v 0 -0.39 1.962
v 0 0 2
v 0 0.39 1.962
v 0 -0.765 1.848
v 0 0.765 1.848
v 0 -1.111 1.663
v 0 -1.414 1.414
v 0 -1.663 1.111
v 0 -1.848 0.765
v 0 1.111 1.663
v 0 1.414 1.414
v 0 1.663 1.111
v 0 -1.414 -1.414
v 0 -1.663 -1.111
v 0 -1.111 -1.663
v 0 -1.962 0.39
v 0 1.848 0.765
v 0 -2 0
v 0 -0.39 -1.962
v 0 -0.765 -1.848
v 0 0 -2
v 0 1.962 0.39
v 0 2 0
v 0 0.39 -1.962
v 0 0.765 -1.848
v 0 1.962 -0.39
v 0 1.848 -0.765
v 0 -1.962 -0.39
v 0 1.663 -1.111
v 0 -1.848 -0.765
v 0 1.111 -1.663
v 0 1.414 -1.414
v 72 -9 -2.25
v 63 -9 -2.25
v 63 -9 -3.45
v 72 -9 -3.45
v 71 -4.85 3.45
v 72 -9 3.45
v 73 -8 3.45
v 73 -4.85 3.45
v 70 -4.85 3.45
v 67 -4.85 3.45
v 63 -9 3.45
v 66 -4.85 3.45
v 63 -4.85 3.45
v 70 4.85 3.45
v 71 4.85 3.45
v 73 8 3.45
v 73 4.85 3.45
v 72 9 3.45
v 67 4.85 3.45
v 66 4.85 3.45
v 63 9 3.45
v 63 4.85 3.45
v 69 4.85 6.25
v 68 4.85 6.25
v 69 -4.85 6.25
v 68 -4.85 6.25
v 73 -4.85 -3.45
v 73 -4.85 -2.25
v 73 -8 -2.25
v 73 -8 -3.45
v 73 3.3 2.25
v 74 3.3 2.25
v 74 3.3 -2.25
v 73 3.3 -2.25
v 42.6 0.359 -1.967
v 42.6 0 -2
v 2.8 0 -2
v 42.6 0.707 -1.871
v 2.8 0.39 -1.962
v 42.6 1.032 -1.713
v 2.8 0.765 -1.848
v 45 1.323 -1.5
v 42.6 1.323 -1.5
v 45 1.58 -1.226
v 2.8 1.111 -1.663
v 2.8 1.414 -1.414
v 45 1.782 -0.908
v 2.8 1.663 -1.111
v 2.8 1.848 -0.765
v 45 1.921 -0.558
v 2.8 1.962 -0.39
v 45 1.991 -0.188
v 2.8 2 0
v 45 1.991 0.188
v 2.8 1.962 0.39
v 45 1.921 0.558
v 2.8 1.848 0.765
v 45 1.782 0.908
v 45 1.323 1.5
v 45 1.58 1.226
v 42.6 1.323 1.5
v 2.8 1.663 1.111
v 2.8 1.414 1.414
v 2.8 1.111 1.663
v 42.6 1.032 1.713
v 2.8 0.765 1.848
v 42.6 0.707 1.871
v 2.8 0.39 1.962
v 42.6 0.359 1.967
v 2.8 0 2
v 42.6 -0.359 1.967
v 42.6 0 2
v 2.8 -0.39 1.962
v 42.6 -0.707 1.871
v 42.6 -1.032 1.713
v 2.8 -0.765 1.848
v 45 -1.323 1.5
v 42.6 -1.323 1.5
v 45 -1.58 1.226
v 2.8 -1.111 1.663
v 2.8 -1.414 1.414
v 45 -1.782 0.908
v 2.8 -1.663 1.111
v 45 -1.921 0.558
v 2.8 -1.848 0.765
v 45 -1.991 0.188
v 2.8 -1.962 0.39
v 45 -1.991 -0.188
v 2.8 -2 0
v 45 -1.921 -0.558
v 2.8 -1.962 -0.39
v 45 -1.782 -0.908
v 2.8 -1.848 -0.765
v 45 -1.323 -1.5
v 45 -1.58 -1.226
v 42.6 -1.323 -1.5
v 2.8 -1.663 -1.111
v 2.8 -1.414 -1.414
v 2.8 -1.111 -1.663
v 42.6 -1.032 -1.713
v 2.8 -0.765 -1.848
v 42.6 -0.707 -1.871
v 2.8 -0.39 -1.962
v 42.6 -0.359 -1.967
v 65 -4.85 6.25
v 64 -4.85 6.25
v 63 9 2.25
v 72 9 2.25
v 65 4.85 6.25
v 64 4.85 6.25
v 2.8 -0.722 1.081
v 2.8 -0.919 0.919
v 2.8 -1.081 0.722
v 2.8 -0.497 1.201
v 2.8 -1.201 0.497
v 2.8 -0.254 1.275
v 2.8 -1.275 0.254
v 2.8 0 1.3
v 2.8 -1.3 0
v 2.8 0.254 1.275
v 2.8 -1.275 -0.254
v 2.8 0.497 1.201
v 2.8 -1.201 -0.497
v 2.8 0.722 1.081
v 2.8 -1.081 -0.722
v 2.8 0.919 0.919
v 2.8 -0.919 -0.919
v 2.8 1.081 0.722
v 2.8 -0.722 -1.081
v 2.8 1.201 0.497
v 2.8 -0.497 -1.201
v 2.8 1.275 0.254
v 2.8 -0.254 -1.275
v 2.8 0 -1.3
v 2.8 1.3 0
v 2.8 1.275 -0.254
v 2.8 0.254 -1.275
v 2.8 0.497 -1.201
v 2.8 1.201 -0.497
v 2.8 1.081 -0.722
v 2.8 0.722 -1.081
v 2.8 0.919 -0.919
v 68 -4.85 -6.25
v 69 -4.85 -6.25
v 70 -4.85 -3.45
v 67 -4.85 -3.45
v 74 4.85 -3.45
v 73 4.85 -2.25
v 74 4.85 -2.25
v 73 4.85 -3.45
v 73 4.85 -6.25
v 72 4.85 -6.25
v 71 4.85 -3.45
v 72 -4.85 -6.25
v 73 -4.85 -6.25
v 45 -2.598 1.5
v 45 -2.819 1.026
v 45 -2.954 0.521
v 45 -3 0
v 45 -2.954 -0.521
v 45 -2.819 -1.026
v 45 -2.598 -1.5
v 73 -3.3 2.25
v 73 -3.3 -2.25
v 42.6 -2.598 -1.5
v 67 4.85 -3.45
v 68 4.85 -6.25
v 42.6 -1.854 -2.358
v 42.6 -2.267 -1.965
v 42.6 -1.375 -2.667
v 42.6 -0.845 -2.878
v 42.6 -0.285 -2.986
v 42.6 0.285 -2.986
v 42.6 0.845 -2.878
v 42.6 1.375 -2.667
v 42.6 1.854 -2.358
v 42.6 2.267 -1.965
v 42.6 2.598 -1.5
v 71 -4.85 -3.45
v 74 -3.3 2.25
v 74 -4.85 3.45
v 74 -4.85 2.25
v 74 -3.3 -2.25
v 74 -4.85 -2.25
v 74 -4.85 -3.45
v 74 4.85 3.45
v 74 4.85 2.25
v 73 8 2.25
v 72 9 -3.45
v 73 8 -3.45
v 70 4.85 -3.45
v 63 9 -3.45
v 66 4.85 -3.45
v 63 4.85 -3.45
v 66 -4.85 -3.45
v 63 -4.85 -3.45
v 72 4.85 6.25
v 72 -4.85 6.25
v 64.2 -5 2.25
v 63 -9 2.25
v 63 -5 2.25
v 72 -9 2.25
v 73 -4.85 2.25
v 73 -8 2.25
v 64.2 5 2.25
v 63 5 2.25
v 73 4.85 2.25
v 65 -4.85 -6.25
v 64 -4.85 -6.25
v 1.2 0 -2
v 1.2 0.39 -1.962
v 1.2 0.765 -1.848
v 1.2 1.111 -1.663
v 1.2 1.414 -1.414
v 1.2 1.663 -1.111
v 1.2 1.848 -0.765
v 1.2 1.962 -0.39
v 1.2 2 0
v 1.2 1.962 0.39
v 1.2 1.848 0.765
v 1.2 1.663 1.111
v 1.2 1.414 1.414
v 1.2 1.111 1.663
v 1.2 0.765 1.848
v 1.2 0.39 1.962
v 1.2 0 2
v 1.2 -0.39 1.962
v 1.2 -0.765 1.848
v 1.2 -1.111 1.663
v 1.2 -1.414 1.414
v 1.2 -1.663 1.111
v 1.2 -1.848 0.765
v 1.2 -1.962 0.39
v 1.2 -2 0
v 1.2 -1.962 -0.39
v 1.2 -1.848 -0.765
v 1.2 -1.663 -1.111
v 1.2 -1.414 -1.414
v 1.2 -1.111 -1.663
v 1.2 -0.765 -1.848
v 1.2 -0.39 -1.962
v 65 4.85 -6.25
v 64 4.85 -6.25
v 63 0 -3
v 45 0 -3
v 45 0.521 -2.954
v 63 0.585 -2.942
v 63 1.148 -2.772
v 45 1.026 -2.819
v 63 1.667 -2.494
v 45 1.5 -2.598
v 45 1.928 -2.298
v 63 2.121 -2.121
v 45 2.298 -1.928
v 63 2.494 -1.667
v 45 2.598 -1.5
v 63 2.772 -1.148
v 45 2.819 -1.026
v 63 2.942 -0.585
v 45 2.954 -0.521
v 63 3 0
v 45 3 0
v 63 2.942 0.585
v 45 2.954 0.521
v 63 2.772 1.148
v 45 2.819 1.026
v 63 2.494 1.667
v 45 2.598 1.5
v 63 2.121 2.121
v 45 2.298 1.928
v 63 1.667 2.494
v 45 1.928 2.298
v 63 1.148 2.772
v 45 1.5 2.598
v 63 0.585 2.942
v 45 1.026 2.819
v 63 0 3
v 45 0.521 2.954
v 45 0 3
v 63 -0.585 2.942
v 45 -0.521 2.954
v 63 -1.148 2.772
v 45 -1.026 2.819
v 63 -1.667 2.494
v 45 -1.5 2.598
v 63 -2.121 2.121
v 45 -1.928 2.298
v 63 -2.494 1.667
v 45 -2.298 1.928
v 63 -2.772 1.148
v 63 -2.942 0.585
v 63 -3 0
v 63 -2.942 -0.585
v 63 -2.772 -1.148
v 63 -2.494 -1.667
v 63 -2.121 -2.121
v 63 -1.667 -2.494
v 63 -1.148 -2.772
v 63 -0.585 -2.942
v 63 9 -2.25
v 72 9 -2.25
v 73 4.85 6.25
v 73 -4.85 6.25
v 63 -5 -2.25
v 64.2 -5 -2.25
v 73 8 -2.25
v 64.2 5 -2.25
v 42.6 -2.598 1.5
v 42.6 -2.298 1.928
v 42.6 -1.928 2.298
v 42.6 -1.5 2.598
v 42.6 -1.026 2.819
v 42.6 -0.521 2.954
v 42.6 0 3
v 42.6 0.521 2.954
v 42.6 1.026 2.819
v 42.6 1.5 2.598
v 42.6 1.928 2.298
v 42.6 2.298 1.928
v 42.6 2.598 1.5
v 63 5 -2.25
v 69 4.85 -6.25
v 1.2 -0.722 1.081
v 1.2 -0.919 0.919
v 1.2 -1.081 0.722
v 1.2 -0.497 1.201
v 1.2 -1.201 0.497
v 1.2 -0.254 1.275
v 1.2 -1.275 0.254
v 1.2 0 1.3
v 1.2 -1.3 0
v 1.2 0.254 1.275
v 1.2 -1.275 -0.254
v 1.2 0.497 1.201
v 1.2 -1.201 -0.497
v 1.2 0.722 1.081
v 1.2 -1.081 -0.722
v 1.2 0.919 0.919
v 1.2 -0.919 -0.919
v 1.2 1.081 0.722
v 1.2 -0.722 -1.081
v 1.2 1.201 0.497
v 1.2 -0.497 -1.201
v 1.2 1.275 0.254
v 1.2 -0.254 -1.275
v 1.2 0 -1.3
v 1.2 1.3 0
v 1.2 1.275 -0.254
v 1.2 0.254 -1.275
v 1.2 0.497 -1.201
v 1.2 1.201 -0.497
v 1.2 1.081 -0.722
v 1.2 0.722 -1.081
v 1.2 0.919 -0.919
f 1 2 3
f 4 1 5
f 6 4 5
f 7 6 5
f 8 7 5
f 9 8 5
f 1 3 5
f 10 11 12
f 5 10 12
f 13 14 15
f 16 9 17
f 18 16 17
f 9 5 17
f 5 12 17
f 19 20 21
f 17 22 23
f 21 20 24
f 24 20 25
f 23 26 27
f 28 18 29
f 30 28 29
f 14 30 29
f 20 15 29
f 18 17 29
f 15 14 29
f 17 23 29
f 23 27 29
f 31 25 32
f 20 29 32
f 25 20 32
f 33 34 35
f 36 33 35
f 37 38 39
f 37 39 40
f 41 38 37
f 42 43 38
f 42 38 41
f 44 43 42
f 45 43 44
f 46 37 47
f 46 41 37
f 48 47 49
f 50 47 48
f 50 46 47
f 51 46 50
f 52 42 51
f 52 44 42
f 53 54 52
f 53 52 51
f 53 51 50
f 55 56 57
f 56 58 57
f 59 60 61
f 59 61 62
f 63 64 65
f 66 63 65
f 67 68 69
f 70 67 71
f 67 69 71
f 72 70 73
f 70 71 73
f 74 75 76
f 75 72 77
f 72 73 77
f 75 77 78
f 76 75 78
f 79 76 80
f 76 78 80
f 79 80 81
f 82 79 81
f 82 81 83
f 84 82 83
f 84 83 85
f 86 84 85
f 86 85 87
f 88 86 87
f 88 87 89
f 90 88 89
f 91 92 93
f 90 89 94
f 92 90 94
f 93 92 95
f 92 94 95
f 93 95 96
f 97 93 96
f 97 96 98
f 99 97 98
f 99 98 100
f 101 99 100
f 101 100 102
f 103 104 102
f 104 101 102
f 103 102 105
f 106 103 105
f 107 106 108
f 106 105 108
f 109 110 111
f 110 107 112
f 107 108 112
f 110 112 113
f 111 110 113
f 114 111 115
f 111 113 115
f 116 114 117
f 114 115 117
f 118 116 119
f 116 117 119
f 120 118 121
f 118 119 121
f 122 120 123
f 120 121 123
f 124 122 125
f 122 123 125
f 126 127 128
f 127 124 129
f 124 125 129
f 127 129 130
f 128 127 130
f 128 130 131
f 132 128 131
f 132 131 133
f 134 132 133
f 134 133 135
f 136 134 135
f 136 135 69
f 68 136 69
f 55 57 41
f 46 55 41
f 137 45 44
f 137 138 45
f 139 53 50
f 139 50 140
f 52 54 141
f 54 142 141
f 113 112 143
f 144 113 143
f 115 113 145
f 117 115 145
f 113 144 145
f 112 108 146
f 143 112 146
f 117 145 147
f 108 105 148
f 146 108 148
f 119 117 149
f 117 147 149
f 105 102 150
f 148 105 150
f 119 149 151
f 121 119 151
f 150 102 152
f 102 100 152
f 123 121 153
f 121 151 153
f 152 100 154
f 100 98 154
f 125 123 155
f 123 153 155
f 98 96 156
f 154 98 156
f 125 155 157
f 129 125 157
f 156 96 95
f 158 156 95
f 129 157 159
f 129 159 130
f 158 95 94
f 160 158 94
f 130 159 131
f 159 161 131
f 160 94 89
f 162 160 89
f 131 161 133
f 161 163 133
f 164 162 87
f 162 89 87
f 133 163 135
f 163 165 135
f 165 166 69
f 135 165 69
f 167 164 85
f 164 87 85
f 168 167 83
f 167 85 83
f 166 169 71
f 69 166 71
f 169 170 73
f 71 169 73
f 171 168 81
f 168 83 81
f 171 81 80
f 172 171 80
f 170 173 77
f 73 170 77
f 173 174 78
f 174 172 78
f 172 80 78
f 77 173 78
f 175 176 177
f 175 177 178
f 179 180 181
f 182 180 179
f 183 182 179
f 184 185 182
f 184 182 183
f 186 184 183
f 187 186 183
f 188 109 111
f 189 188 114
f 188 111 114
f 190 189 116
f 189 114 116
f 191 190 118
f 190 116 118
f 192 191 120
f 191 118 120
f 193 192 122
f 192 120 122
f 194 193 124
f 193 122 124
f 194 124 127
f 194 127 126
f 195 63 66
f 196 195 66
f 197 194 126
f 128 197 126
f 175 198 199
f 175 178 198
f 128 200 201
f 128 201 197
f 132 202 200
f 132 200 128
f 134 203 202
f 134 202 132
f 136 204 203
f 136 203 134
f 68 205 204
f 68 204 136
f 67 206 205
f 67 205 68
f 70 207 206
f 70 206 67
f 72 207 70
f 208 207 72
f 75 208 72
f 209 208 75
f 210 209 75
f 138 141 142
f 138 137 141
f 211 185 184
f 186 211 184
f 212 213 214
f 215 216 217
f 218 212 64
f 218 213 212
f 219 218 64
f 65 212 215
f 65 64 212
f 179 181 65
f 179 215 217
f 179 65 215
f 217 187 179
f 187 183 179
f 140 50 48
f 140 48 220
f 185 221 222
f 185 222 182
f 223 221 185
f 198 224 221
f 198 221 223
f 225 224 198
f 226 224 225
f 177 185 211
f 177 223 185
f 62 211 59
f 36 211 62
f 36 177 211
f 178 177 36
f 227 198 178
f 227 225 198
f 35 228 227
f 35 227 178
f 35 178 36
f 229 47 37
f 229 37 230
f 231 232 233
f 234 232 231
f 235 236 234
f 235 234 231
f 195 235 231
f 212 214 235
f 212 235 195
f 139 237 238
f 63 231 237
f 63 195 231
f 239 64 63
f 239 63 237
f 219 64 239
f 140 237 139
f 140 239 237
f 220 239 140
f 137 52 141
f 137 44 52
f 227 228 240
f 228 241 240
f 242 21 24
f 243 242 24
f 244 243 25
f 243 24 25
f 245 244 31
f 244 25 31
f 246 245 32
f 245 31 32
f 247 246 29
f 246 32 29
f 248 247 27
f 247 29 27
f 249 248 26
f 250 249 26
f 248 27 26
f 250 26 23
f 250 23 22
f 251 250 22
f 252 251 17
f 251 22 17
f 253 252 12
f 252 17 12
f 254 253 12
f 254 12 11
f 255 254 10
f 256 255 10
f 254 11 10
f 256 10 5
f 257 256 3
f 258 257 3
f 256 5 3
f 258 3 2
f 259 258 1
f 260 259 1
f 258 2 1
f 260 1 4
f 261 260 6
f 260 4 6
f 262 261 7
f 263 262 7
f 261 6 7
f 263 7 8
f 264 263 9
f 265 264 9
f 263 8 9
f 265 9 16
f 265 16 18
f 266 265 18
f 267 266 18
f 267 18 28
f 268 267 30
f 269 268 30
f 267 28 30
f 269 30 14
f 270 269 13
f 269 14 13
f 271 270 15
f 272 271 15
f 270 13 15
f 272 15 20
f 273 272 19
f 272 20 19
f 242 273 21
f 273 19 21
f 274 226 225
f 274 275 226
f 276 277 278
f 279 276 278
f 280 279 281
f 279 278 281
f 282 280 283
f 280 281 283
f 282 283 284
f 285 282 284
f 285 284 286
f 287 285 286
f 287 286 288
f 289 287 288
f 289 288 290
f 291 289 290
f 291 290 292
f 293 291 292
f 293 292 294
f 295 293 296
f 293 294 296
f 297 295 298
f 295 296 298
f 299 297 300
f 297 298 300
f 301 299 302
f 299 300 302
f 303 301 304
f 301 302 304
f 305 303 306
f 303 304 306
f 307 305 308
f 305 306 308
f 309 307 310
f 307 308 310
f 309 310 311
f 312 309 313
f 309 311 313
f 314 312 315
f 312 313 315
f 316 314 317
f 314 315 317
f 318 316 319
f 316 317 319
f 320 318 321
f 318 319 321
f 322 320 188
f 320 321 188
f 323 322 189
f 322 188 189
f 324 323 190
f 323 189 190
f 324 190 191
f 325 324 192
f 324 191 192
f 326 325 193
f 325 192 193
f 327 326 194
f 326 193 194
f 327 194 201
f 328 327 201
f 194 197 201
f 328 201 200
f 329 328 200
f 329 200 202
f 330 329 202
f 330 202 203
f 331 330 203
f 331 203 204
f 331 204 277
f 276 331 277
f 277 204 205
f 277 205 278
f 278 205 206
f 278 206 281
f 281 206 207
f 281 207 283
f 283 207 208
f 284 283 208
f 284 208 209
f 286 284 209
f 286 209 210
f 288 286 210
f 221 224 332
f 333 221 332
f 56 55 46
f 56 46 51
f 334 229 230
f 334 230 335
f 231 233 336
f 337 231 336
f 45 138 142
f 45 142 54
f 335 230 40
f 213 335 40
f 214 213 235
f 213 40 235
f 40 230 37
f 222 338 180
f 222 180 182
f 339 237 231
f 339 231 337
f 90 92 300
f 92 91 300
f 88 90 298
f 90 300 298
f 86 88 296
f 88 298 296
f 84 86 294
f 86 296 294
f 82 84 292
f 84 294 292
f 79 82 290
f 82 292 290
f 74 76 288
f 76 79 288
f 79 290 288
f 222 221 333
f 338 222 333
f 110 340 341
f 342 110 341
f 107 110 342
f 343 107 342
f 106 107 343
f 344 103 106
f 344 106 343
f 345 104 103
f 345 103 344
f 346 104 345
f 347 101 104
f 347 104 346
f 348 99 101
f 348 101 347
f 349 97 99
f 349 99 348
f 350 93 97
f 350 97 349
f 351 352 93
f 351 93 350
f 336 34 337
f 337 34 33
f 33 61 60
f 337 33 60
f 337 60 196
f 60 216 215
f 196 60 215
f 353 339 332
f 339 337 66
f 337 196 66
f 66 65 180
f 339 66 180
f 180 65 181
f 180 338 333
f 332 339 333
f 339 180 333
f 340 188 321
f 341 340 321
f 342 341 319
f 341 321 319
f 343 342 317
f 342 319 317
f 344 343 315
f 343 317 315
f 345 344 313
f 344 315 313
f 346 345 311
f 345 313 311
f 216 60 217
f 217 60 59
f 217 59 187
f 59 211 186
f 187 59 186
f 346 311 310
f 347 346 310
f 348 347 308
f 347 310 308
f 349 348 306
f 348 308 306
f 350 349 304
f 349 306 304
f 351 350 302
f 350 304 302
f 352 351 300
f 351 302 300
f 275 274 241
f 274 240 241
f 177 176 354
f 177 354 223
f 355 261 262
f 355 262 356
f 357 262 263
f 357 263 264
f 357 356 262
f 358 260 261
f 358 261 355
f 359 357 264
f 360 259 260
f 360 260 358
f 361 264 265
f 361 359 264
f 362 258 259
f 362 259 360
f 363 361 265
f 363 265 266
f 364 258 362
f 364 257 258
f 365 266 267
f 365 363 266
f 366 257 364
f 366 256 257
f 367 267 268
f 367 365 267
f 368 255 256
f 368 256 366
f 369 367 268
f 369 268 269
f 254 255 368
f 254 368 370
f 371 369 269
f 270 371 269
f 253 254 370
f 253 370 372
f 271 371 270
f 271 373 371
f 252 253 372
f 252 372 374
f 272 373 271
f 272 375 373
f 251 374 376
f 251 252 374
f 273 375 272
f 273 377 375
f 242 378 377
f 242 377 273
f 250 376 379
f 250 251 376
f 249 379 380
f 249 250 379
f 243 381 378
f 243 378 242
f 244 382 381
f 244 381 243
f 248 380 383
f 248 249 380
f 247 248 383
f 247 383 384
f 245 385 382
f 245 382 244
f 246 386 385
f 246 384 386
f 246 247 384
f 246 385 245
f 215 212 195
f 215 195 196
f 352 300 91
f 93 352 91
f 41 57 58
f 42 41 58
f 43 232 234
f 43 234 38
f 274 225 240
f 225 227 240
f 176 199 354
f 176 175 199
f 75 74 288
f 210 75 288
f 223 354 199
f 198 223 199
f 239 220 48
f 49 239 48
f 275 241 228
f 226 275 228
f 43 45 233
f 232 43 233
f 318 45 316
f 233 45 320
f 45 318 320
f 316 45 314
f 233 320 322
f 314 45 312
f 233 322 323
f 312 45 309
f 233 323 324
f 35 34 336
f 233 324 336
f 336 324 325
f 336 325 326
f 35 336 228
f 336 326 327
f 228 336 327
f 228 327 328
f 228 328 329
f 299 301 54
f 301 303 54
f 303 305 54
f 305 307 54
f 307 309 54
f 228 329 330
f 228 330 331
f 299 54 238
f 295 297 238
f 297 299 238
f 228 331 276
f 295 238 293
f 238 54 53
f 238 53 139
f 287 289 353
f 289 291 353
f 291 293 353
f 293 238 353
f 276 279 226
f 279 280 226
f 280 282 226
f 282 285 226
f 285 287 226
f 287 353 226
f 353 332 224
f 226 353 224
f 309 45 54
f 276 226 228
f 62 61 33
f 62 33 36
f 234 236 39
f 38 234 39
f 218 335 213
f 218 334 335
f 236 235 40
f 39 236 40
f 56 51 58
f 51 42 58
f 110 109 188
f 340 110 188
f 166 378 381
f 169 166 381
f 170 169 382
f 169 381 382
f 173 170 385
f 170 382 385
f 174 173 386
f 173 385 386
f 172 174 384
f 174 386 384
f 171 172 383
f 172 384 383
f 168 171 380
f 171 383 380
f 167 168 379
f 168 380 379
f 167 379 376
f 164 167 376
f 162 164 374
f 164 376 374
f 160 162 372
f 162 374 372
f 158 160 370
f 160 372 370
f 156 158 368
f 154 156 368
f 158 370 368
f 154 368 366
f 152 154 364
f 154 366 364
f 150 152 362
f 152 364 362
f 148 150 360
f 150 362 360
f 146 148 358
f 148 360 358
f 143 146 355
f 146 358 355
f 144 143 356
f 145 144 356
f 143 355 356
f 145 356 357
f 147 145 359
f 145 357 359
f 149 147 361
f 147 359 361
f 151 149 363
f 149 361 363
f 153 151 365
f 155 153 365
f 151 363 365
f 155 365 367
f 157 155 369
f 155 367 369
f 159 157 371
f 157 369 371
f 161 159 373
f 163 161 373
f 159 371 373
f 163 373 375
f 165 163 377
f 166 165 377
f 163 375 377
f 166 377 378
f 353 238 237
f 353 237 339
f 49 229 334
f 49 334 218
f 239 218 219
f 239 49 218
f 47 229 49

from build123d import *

# Parameters (mm, degrees)
SKETCH1_R            = 2
BOSS_EXTRUDE1_DEPTH  = 1.2
SKETCH2_R            = 1.3
BOSS_EXTRUDE2_DEPTH  = 1.6
SKETCH3_R            = 2
BOSS_EXTRUDE3_DEPTH  = 42.2
SKETCH4_R            = 3
BOSS_EXTRUDE4_DEPTH  = 18
BOSS_EXTRUDE7_DEPTH  = 2.4
SKETCH6_W            = 6.9
SKETCH6_H            = 10
BOSS_EXTRUDE8_DEPTH  = 1.2
BOSS_EXTRUDE9_DEPTH  = 10
CHAMFER1_SIZE        = 1
BOSS_EXTRUDE10_DEPTH = 4.85
SKETCH9_W            = 6.9
SKETCH9_H            = 9.7
BOSS_EXTRUDE11_DEPTH = 1
SKETCH11_W           = 4.5
SKETCH11_H           = 1.55
CUT_EXTRUDE1_DEPTH   = 1


with BuildPart() as part:
    # Sketch1 → Boss-Extrude1 (new body)
    with BuildSketch(Plane(origin=(0, 0, 0), x_dir=(0, 0, -1), z_dir=(1, 0, 0))):
        Circle(SKETCH1_R)
    extrude(amount=BOSS_EXTRUDE1_DEPTH)

    # Sketch2 → Boss-Extrude2 (add)
    with BuildSketch(Plane(origin=(1.2, 0, 0), x_dir=(0, 0, -1), z_dir=(1, 0, 0))):
        Circle(SKETCH2_R)
    extrude(amount=BOSS_EXTRUDE2_DEPTH)

    # Sketch3 → Boss-Extrude3 (add)
    with BuildSketch(Plane(origin=(2.8, 0, 0), x_dir=(0, 0, -1), z_dir=(1, 0, 0))):
        Circle(SKETCH3_R)
    extrude(amount=BOSS_EXTRUDE3_DEPTH)

    # Sketch4 → Boss-Extrude4 (add)
    with BuildSketch(Plane(origin=(45, 0, 0), x_dir=(0, 0, -1), z_dir=(1, 0, 0))):
        Circle(SKETCH4_R)
    extrude(amount=BOSS_EXTRUDE4_DEPTH)

    # Sketch5 → Boss-Extrude7 (add)
    with BuildSketch(Plane.ZY.offset(-45)):
        with BuildLine():
            ThreePointArc((3, 0), (2.598076211, 1.5), (1.5, 2.598076211))
            Line((1.5, 2.598076211), (1.5, -2.598076211))
            ThreePointArc((1.5, -2.598076211), (2.598076211, -1.5), (3, 0))
        make_face()
        with BuildLine():
            Line((-1.5, -2.598076211), (-1.5, 2.598076211))
            ThreePointArc((-1.5, 2.598076211), (-3, 0), (-1.5, -2.598076211))
        make_face()
    extrude(amount=BOSS_EXTRUDE7_DEPTH)

    # Sketch6 → Boss-Extrude8 (add)
    with BuildSketch(Plane(origin=(63, 0, 0), x_dir=(0, 0, -1), z_dir=(1, 0, 0))):
        Rectangle(SKETCH6_W, SKETCH6_H)
    extrude(amount=BOSS_EXTRUDE8_DEPTH)

    # Sketch7 → Boss-Extrude9 (add)
    with BuildSketch(Plane.ZY.offset(-63)):
        Polygon((-3.45, 5), (-3.45, 9), (-2.25, 9), (-2.25, -9), (-3.45, -9), (-3.45, -5), align=None)
        Polygon((3.45, 9), (2.25, 9), (2.25, -9), (3.45, -9), (3.45, -5), (3.45, 5), align=None)
    extrude(amount=-BOSS_EXTRUDE9_DEPTH)

    # Chamfer1
    chamfer1_edges = [part.edges().sort_by_distance(p)[0] for p in [
        (73, 9, -2.85),
        (73, -9, -2.85),
        (73, -9, 2.85),
        (73, 9, 2.85),
    ]]
    chamfer(chamfer1_edges, length=CHAMFER1_SIZE)

    # Sketch8 → Boss-Extrude10 (add, symmetric)
    with BuildSketch(Plane(origin=(0, 0, 0), x_dir=(1, 0, 0), z_dir=(0, 1, 0))):
        Polygon((63, 3.45), (66, 3.45), (65, 6.25), (64, 6.25), align=None)
        Polygon((68, 6.25), (69, 6.25), (70, 3.45), (67, 3.45), align=None)
        Polygon((72, 6.25), (73, 6.25), (74, 3.45), (71, 3.45), align=None)
    boss_extrude10 = extrude(amount=BOSS_EXTRUDE10_DEPTH, both=True)

    # Mirror1: Boss-Extrude10 across plane
    add(boss_extrude10.mirror(Plane.XY))

    # Sketch9 → Boss-Extrude11 (add)
    with BuildSketch(Plane(origin=(73, 0, 0), x_dir=(0, 0, -1), z_dir=(1, 0, 0))):
        Rectangle(SKETCH9_W, SKETCH9_H)
    extrude(amount=BOSS_EXTRUDE11_DEPTH)

    # Sketch11 → Cut-Extrude1 (cut)
    with BuildSketch(Plane(origin=(74, 0, 0), x_dir=(0, 0, -1), z_dir=(1, 0, 0))):
        with Locations((0, -4.075)):
            Rectangle(SKETCH11_W, SKETCH11_H)
        with Locations((0, 4.075)):
            Rectangle(SKETCH11_W, SKETCH11_H)
    extrude(amount=-CUT_EXTRUDE1_DEPTH, mode=Mode.SUBTRACT)


solid = part.part
